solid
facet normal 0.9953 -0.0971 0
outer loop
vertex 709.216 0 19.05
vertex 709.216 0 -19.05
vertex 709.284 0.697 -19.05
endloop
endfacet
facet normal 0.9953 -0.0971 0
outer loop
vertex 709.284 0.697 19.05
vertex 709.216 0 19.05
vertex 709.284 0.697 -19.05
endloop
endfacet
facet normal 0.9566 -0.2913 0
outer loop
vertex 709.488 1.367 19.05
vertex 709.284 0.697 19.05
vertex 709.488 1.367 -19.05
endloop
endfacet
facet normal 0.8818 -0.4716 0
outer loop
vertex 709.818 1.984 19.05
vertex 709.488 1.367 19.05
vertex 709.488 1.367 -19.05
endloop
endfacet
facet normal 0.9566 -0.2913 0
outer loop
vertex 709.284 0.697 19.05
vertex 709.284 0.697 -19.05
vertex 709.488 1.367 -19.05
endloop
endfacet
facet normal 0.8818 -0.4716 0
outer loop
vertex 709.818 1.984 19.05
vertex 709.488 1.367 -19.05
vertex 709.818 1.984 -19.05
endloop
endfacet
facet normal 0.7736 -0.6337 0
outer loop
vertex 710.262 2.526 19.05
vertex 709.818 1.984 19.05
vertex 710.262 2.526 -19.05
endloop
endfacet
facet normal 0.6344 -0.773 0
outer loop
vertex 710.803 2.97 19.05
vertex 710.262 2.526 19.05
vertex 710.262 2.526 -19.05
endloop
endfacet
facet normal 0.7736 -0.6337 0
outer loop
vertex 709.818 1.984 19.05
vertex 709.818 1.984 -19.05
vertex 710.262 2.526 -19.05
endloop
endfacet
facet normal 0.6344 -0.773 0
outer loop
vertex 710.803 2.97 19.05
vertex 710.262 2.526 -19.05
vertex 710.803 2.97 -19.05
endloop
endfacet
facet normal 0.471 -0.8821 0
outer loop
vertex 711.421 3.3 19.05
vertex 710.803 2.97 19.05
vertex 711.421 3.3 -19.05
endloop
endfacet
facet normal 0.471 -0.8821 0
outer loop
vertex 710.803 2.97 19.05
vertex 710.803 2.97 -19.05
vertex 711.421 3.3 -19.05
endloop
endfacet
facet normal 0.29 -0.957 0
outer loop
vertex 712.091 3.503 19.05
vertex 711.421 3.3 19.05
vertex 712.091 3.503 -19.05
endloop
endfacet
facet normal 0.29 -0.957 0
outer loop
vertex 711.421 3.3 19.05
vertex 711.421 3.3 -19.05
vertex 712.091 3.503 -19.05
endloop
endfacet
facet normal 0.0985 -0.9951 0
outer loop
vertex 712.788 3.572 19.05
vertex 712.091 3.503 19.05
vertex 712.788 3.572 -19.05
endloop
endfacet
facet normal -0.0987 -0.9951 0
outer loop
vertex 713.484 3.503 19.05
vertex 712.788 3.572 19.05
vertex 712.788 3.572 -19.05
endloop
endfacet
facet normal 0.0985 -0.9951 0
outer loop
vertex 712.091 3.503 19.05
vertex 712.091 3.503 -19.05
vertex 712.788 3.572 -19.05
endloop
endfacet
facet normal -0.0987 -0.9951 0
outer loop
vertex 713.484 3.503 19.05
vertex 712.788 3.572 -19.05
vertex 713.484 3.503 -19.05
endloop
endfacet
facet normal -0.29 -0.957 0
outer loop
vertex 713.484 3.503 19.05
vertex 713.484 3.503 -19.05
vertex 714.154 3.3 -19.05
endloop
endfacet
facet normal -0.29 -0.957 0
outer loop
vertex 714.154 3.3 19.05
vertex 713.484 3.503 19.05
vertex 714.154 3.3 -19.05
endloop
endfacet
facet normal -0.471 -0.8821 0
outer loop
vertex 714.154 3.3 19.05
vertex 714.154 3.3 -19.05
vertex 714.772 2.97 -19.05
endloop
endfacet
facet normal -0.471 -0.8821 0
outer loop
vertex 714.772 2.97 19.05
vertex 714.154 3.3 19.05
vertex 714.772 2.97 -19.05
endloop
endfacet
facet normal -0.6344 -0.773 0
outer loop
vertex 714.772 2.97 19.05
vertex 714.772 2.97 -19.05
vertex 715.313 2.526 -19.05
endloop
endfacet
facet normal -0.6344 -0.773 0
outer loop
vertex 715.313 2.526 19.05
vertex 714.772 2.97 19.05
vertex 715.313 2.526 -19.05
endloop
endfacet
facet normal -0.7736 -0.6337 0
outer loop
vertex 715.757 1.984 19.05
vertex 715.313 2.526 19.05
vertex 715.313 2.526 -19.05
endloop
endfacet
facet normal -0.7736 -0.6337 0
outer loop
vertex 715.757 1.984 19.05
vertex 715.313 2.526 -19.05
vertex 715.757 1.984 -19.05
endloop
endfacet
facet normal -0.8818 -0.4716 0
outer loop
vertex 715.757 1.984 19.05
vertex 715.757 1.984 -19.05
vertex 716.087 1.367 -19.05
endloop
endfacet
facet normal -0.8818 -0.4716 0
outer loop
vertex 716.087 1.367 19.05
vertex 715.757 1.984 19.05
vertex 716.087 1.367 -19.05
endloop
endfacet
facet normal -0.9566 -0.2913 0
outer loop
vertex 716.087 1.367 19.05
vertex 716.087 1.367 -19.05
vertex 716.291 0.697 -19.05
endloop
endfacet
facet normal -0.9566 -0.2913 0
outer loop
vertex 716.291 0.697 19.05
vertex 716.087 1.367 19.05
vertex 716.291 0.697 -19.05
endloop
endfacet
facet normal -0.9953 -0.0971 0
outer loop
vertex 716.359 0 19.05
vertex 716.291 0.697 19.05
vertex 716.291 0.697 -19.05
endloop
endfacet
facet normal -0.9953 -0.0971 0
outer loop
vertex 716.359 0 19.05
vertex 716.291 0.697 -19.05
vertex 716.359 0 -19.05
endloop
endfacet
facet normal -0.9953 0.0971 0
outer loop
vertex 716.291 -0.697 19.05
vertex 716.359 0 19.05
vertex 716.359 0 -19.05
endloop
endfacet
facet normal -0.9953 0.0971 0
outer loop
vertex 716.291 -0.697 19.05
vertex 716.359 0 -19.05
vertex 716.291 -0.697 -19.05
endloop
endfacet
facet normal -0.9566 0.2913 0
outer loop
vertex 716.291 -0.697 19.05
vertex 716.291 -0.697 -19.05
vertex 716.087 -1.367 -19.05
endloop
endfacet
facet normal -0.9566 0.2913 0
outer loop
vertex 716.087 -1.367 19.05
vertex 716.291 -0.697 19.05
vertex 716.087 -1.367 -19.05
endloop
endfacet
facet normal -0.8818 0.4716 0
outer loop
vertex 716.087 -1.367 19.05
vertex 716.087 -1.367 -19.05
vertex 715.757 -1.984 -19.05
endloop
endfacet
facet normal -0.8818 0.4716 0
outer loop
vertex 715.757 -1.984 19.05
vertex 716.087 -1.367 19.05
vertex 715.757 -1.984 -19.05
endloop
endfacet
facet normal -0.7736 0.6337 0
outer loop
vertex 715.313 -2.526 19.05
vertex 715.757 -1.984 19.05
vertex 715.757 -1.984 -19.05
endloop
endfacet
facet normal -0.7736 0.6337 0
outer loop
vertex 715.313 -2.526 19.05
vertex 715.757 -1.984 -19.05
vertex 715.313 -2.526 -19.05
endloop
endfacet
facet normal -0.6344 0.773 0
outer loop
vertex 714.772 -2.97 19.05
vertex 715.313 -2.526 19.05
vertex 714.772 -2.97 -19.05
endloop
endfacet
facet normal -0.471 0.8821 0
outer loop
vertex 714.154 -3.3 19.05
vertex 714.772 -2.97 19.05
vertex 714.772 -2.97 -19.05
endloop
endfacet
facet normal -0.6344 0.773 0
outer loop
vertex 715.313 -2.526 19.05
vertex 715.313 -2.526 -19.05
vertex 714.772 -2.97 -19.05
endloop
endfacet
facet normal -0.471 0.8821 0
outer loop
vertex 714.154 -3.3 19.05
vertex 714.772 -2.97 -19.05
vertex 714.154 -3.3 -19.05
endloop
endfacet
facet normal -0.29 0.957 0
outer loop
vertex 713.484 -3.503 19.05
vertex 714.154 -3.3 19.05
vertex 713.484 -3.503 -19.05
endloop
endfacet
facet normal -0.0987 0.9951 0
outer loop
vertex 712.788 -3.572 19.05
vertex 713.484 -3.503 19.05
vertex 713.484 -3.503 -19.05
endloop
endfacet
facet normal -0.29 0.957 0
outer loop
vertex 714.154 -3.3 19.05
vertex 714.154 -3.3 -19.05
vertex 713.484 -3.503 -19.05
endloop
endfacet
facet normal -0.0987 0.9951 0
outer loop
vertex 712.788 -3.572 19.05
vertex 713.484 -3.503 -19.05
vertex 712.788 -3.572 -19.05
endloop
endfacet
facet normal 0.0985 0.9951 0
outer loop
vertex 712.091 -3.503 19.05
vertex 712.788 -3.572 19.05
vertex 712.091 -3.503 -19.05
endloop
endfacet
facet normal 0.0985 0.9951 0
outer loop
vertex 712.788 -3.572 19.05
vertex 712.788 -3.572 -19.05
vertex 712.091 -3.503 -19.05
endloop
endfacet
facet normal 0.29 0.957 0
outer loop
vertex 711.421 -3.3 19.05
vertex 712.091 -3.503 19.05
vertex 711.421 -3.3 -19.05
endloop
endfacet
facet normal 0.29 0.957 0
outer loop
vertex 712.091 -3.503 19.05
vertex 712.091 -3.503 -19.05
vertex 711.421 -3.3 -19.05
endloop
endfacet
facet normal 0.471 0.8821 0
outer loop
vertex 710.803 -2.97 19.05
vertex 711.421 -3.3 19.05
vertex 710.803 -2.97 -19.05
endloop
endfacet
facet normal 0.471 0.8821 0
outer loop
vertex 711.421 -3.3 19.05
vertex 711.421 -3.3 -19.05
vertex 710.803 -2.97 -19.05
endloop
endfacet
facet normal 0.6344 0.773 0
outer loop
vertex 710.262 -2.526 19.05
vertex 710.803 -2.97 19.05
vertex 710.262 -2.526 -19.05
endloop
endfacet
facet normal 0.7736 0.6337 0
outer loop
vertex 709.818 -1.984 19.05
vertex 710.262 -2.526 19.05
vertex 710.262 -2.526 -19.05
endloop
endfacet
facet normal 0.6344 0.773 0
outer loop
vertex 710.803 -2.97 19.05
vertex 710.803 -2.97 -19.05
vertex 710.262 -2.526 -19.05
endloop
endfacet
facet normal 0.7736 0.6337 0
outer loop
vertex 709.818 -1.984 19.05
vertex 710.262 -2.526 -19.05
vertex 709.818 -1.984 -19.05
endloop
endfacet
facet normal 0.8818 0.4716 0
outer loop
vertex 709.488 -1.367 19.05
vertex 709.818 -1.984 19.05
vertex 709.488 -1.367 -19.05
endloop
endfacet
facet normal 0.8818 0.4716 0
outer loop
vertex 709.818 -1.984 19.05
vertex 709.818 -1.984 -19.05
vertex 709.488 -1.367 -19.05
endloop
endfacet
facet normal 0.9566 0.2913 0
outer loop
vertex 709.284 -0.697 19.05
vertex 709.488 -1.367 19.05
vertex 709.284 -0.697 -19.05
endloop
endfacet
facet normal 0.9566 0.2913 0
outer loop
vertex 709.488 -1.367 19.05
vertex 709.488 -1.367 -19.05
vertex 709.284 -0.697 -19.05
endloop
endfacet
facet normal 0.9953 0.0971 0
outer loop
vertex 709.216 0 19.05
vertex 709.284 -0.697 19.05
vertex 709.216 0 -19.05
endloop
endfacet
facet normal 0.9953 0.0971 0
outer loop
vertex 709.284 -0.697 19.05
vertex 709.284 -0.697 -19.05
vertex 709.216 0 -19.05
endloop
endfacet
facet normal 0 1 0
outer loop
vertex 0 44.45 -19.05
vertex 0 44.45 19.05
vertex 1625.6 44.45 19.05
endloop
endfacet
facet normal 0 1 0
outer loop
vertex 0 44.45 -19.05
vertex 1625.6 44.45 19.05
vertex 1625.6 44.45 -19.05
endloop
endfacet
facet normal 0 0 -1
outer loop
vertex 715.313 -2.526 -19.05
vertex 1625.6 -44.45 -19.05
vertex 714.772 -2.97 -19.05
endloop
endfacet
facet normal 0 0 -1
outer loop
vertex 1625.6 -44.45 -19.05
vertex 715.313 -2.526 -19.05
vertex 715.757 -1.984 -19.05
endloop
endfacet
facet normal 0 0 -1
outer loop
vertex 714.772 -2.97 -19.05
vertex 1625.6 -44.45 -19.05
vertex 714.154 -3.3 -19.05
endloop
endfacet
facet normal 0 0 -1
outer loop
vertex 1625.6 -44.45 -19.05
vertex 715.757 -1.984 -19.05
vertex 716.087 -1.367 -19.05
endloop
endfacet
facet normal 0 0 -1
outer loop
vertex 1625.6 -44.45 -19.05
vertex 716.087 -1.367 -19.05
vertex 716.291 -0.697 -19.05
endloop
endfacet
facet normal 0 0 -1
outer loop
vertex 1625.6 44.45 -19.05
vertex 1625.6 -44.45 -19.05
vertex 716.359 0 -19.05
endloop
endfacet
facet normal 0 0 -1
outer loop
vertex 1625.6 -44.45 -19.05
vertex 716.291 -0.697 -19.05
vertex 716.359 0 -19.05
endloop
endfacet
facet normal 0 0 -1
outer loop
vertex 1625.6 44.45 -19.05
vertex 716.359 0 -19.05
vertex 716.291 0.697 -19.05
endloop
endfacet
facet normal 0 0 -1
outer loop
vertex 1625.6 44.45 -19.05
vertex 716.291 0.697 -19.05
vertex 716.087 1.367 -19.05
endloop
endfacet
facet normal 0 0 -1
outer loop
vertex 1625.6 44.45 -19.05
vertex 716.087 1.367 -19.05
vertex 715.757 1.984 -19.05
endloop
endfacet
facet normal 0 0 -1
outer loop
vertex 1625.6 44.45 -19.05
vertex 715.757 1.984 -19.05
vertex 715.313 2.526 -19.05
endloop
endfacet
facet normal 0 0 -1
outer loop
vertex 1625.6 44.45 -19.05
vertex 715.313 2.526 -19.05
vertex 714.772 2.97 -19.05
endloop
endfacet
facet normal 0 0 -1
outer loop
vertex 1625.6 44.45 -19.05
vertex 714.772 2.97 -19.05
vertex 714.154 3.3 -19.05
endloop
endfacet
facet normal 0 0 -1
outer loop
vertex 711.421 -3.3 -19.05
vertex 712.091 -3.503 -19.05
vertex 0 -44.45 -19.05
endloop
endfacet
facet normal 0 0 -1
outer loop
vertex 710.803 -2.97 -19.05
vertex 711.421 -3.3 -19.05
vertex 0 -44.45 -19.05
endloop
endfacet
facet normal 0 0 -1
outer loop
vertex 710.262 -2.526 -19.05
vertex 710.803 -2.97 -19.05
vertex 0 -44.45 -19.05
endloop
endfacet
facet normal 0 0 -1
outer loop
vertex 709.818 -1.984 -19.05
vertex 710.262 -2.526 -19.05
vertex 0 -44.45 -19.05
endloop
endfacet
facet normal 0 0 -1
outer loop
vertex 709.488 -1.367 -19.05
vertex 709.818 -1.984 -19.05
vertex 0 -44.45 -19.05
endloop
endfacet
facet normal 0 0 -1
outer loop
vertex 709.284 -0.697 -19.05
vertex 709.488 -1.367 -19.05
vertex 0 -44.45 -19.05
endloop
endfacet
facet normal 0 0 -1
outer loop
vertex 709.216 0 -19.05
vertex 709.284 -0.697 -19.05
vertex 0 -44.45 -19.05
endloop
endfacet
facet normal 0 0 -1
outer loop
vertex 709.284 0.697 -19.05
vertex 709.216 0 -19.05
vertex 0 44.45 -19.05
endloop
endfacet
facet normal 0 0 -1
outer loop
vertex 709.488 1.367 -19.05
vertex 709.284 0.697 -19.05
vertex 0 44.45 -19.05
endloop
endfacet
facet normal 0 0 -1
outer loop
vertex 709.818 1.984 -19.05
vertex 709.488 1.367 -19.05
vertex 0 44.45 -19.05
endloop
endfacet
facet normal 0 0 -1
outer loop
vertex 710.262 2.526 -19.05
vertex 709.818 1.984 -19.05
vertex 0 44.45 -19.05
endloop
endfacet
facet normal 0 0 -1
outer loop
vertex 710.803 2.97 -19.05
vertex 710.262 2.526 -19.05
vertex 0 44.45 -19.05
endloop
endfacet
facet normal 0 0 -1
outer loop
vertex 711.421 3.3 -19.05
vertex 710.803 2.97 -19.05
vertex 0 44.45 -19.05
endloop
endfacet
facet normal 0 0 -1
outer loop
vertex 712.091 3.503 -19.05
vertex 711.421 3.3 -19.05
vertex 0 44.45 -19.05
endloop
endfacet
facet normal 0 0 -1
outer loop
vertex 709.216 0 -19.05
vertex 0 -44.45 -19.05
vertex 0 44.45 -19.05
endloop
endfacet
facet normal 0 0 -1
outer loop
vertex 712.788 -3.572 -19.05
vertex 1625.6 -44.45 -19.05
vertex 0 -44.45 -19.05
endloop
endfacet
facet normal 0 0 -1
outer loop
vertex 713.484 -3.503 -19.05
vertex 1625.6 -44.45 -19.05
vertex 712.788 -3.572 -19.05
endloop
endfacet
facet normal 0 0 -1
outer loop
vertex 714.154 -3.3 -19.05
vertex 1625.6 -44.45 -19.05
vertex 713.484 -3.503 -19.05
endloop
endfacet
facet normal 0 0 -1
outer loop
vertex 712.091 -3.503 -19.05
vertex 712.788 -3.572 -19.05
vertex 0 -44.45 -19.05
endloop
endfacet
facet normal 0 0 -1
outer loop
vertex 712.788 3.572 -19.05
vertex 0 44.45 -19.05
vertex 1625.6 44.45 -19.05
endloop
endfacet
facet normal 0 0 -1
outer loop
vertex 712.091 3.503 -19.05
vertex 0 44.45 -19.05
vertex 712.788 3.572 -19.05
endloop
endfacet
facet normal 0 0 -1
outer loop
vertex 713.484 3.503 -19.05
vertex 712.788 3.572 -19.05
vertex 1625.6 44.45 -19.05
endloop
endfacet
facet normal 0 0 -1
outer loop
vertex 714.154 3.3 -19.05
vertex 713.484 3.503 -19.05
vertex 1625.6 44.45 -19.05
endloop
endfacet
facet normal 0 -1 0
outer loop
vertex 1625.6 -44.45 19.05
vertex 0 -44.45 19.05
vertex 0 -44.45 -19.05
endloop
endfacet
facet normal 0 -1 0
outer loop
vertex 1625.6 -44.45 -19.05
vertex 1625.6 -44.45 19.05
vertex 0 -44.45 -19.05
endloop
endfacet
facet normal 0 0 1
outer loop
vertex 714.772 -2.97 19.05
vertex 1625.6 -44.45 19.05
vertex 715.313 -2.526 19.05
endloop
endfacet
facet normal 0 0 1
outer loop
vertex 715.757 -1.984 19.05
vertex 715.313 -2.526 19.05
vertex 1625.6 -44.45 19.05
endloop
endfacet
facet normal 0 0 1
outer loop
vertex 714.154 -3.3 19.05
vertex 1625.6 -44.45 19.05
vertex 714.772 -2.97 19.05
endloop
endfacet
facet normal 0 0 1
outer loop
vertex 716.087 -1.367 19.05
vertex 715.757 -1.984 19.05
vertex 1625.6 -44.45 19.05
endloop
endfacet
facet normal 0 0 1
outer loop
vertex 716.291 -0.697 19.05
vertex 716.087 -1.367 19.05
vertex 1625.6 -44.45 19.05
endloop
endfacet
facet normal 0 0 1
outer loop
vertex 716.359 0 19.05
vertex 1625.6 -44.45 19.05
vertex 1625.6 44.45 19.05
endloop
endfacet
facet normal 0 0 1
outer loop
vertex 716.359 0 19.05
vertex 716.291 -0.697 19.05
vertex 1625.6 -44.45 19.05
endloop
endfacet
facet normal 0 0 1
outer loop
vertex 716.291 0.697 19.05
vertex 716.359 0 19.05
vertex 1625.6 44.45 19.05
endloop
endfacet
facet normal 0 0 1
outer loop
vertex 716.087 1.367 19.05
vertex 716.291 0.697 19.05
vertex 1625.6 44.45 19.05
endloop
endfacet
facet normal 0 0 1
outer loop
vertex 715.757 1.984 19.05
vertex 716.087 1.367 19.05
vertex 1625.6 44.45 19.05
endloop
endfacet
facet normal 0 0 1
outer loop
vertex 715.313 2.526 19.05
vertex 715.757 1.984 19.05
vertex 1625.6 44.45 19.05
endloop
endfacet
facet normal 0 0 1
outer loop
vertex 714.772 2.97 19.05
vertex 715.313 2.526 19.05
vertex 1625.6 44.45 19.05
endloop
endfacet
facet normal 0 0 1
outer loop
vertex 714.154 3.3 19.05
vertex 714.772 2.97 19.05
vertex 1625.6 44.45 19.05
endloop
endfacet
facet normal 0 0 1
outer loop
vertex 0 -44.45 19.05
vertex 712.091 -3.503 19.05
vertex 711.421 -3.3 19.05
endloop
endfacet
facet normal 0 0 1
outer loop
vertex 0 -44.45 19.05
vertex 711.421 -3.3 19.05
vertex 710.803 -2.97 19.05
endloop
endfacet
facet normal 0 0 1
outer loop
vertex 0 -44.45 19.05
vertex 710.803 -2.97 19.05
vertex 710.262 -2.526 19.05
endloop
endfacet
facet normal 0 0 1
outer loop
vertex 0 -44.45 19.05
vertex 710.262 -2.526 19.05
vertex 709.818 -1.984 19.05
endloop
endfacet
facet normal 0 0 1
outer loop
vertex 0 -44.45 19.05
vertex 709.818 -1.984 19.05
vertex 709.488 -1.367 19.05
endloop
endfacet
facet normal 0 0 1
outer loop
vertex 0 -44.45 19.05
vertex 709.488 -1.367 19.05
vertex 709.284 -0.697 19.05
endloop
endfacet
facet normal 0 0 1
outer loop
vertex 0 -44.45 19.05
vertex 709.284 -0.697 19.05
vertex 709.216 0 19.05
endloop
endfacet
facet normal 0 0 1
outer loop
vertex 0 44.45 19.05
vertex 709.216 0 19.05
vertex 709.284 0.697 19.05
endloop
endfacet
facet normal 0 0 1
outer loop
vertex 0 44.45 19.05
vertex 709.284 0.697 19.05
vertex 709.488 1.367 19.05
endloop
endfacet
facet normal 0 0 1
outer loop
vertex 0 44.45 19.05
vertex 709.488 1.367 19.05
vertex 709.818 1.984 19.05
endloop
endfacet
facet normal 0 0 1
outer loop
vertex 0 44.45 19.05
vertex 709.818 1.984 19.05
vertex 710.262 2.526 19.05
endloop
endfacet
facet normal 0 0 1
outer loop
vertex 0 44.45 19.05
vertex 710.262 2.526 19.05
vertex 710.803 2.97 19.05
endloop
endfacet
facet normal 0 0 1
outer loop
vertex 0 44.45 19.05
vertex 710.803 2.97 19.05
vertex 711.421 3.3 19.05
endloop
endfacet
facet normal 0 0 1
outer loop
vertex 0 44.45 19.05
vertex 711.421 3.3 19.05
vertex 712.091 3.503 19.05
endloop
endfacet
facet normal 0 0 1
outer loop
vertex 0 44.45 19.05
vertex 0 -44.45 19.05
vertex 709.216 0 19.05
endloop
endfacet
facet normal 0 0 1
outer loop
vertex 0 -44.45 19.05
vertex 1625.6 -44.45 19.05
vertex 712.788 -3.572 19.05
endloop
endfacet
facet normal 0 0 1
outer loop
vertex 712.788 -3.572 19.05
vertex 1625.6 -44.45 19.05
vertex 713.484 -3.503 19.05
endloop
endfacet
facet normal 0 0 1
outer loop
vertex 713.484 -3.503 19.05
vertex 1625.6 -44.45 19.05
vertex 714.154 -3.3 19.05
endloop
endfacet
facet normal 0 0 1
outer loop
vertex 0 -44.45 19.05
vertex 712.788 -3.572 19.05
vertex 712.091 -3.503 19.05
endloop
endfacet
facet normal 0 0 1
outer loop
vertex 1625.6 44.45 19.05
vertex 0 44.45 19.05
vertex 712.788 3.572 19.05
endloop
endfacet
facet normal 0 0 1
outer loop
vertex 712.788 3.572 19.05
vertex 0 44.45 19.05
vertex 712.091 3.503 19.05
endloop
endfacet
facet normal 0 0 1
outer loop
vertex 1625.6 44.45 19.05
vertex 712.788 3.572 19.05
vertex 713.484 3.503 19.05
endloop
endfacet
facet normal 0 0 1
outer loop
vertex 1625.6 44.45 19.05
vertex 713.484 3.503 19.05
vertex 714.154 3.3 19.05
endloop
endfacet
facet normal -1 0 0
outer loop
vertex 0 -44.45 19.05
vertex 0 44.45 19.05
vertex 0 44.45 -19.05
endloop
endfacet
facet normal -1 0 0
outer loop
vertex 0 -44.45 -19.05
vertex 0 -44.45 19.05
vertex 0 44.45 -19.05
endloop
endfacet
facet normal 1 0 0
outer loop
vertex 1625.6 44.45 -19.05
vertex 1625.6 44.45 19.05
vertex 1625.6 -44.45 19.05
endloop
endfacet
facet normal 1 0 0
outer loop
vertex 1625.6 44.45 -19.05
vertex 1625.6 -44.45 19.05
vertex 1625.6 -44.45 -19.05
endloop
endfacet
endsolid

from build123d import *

# Parameters (mm, degrees)
SKETCH1_W                       = 38.1
SKETCH1_H                       = 88.9
BOSS_EXTRUDE1_DEPTH             = 1625.6
F_9_32_0_28125_DIAMETER_HOLE1_D = 7.14375


with BuildPart() as part:
    # Sketch1 → Boss-Extrude1 (new body)
    with BuildSketch(Plane(origin=(0, 0, 0), x_dir=(0, 0, -1), z_dir=(1, 0, 0))):
        Rectangle(SKETCH1_W, SKETCH1_H)
    extrude(amount=BOSS_EXTRUDE1_DEPTH)

    # 9/32 (0.28125) Diameter Hole1 (through all)
    with Locations(Plane.XY.offset(19.05)):
        with Locations((712.7875, 0)):
            Hole(F_9_32_0_28125_DIAMETER_HOLE1_D / 2)


solid = part.part
